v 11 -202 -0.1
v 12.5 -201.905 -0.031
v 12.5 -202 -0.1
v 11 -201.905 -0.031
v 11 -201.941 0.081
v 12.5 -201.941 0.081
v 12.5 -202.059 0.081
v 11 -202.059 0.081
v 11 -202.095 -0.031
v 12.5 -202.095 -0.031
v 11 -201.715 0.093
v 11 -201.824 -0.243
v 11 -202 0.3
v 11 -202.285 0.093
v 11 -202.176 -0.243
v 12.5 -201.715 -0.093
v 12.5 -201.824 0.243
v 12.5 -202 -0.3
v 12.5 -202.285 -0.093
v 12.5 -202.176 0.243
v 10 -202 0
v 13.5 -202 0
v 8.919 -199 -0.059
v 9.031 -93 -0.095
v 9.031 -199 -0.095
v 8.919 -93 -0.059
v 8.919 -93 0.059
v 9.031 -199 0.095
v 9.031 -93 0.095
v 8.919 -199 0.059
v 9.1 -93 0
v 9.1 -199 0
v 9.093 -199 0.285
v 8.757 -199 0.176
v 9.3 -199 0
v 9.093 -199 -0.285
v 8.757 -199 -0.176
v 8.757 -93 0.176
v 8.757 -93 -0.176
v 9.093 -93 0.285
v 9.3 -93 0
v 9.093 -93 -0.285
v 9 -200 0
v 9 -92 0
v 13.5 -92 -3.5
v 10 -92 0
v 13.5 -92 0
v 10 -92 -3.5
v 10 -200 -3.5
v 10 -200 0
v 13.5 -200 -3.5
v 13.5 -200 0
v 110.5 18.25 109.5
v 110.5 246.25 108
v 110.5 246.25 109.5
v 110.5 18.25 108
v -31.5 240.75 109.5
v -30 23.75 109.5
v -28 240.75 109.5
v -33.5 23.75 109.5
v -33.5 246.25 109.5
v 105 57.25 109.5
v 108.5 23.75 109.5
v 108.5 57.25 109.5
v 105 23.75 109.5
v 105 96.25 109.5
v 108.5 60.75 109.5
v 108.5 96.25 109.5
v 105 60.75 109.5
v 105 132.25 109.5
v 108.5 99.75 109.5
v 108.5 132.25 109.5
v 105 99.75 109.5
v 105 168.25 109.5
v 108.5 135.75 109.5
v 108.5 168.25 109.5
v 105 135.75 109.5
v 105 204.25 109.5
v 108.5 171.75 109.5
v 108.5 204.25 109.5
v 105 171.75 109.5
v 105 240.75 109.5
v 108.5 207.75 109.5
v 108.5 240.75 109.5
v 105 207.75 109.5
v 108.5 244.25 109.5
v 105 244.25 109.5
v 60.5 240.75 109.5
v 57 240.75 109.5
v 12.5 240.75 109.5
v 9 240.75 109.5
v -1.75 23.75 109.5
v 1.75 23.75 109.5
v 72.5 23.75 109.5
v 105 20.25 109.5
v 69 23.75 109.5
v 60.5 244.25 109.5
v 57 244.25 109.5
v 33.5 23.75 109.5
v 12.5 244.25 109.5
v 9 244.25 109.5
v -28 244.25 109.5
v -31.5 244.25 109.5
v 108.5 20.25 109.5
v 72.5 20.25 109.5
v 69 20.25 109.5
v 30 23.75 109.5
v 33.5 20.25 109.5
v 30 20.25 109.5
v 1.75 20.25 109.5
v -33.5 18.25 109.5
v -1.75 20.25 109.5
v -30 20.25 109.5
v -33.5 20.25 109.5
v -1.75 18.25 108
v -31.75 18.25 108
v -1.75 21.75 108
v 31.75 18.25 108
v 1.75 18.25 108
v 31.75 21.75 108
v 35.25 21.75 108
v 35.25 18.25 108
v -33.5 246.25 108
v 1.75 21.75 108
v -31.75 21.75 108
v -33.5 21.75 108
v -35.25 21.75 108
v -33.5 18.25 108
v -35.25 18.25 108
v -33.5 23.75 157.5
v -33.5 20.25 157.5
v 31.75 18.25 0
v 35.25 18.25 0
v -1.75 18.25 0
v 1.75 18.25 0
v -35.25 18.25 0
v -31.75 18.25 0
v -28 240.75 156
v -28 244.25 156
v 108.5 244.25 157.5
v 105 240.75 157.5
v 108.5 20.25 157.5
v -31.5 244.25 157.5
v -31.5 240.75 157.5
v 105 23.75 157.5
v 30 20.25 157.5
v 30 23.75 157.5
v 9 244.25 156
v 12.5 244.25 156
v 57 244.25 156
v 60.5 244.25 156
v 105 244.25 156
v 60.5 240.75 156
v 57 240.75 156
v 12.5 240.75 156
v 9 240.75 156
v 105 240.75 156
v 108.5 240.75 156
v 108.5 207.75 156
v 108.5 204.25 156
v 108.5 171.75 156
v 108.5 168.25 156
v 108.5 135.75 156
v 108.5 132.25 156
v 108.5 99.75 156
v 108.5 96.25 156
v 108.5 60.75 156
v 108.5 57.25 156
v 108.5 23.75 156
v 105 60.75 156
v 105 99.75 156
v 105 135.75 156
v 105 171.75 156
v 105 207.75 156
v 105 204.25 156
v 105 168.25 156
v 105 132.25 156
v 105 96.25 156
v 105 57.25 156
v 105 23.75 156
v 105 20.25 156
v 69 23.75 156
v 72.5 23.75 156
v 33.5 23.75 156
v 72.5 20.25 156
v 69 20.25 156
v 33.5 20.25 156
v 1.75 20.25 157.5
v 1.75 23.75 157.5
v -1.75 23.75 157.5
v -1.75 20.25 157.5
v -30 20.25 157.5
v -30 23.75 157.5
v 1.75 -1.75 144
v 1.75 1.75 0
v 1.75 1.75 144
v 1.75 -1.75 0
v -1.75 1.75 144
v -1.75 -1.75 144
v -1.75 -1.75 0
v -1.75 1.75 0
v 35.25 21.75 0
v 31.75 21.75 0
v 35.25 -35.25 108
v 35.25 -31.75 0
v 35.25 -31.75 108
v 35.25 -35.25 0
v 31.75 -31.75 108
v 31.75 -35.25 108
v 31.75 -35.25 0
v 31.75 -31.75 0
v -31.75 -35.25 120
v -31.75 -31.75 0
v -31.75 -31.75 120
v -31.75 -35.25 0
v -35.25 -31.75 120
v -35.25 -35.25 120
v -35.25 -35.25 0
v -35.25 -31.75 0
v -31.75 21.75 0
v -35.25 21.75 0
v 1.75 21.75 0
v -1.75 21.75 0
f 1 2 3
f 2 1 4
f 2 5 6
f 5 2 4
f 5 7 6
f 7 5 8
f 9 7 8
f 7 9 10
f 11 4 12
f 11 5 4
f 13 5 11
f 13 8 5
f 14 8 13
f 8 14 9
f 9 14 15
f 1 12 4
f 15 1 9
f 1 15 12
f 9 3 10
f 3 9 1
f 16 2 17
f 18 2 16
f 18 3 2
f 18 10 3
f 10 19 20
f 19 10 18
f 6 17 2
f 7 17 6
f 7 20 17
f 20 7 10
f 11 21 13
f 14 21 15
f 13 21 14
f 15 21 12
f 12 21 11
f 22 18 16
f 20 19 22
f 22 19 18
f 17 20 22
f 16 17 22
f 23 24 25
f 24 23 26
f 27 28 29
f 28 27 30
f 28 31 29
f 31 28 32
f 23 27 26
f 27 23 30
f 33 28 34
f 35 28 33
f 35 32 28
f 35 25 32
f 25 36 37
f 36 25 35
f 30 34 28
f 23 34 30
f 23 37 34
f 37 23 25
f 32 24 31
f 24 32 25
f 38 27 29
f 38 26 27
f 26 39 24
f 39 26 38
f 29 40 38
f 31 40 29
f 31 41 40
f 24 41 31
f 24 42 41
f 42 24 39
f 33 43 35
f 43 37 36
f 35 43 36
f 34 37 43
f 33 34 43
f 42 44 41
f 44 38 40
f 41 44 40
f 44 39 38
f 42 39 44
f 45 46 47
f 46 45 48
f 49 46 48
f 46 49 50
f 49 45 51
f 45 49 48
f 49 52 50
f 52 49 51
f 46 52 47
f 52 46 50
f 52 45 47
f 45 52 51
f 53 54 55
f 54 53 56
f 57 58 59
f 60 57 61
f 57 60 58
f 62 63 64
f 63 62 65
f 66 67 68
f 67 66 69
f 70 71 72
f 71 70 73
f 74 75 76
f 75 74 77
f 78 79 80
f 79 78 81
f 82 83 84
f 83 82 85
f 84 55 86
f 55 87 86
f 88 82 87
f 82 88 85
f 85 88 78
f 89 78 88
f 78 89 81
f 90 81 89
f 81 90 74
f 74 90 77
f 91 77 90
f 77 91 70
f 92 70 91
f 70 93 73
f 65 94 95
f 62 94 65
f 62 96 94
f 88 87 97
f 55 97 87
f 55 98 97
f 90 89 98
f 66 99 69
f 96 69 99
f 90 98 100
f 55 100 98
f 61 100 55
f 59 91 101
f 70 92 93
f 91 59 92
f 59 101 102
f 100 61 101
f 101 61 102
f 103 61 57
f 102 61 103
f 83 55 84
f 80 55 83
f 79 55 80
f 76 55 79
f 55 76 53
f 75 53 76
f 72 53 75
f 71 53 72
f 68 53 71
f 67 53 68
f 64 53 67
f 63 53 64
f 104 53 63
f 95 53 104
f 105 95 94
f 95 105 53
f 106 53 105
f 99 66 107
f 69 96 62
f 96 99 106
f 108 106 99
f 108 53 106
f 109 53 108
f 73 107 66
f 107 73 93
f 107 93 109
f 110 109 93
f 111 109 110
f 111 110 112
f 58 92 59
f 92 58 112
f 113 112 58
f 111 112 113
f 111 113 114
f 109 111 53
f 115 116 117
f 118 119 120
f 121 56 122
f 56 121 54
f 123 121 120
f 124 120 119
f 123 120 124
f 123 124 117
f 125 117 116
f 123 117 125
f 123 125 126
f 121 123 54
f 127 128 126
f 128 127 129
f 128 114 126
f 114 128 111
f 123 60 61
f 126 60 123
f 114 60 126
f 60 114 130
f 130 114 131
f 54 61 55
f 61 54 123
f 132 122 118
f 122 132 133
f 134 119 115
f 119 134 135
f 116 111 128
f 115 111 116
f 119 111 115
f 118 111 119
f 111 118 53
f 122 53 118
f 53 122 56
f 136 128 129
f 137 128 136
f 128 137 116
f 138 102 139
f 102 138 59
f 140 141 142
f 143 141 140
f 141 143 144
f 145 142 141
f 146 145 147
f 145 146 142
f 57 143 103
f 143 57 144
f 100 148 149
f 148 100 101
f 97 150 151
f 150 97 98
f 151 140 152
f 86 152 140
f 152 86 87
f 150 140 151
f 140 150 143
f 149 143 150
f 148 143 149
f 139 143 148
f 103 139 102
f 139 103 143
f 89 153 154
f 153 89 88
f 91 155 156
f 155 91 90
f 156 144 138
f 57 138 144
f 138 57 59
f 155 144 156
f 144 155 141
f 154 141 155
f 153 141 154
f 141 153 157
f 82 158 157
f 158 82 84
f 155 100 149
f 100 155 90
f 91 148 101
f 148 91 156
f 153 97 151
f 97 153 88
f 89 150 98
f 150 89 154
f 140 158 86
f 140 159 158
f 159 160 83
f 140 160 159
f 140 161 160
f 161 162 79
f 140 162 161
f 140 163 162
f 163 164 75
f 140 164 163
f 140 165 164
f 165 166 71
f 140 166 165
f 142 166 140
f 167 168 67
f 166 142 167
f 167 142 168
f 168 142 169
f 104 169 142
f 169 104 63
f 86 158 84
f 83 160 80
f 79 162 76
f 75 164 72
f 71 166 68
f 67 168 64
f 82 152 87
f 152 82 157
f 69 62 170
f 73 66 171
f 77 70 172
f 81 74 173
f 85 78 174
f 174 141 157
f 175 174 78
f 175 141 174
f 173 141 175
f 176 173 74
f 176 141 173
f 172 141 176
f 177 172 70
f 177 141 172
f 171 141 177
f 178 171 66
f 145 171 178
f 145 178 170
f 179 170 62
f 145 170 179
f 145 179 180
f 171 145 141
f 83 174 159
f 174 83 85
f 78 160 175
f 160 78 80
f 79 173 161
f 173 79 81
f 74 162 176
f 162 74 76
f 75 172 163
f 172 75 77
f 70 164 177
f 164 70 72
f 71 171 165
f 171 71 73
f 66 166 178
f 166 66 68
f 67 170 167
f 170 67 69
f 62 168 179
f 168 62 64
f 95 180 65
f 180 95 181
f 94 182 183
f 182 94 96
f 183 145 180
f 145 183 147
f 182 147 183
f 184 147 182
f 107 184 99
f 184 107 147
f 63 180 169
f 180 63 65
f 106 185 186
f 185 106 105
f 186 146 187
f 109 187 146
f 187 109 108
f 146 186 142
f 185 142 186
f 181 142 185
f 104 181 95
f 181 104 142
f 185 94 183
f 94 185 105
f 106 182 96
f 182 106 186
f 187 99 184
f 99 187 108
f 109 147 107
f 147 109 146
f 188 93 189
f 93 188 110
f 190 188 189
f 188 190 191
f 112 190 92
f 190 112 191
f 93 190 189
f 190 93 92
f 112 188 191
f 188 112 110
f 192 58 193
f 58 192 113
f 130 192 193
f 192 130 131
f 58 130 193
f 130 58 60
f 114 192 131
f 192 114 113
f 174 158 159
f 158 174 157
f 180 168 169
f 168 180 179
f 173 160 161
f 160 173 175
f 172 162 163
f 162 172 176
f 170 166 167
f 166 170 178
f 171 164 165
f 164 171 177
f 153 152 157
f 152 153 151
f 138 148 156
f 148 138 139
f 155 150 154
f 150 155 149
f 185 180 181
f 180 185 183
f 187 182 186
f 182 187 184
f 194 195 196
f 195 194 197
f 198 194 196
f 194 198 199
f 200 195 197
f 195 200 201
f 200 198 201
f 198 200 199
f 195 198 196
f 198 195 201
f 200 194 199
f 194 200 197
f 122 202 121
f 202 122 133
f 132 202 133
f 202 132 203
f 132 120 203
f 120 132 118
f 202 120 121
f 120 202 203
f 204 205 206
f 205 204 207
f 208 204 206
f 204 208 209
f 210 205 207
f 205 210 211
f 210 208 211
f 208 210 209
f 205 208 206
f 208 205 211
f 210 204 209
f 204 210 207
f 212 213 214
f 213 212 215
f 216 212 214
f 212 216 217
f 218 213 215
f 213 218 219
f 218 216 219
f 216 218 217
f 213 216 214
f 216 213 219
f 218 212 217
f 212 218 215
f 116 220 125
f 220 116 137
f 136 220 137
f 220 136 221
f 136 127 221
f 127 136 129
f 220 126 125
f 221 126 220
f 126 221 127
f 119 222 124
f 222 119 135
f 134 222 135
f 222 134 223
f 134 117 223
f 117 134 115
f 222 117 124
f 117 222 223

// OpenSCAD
// file: ../lib/common.scad
//--------------------------------------------------------------------------------------------------
// Module Prism
//--------------------------------------------------------------------------------------------------
module prism(z, y, x)
{
    rotate([0, 90, 0])
    {
        polyhedron(
                points=[[0,0,0], [x,0,0], [x,y,0], [0,y,0], [0,y,z], [x,y,z]],
                faces=[[0,1,2,3],[5,4,3,2],[0,4,5,1],[0,3,4],[5,2,1]]);
    }
}

//--------------------------------------------------------------------------------------------------
// Module Side panel
//--------------------------------------------------------------------------------------------------
module rect_cut(x, y, z, dx, dy)
{
    // Top panel
    translate([0, dy, 0])
    {
        cube([x, y - dy, z]);
    };

    // Left bottom panel
    translate([0, 0, 0])
    {
        cube([dx, dy, z]);
    };

    // Triangle
    translate([dx, 0, 0])
    {
        rotate([0, 0, 0])
        {
            prism(x - dx, dy, -z);
        }
    };
}

//--------------------------------------------------------------------------------------------------
// X dimensional arrow
//--------------------------------------------------------------------------------------------------
module arrow_x(l)
{
    line_w = 0.1;
    arrow_w = 1;
    arrow_h = 0.3;

    // Line
    translate([l / 2, 0, 0])
    {
        rotate([0, 90, 0])
        {
            color([0.4, 0.4, 0.4])
            cylinder(l - arrow_w * 2, line_w, line_w, true);
        }
    }

    // Left arrow
    translate([arrow_w, 0, 0])
    {
        rotate([0, 270, 0])
        {
            color([0.4, 0.4, 0.4])
            cylinder(arrow_w, arrow_h, 0, false);
        }
    }

    // Right arrow
    translate([l - arrow_w, 0, 0])
    {
        rotate([0, 90, 0])
        {
            color([0.4, 0.4, 0.4])
            cylinder(arrow_w, arrow_h, 0, false);
        }
    }

    // Text
    translate([l/3, 0.5, 0])
    {
        color([0.4, 0.4, 0.4])
        text(str(l), size=1);
    }
}

//--------------------------------------------------------------------------------------------------
// Y dimensional arrow
//--------------------------------------------------------------------------------------------------
module arrow_y(l)
{
    line_w = 0.1;
    arrow_w = 1;
    arrow_h = 0.3;

    // Line
    translate([0, l / 2, 0])
    {
        rotate([90, 0, 00])
        {
            color([0.4, 0.4, 0.4])
            cylinder(l - arrow_w * 2, line_w, line_w, true);
        }
    }

    // Left arrow
    translate([0 ,arrow_w, 0])
    {
        rotate([90, 0, 0])
        {
            color([0.4, 0.4, 0.4])
            cylinder(arrow_w, arrow_h, 0, false);
        }
    }

    // Right arrow
    translate([0, l - arrow_w, 0])
    {
        rotate([270, 0, 0])
        {
            color([0.4, 0.4, 0.4])
            cylinder(arrow_w, arrow_h, 0, false);
        }
    }

    // Text
    translate([-0.5, l/3, 0])
    {
        rotate([0 ,0, 90])
        {
            color([0.4, 0.4, 0.4])
            text(str(l), size=1);
        }
    }
}

//--------------------------------------------------------------------------------------------------
// Z dimensional arrow
//--------------------------------------------------------------------------------------------------
module arrow_z(l)
{
    line_w = 0.11;
    arrow_w = 1;
    arrow_h = 0.3;

    // Line
    translate([0, 0, l / 2])
    {
        rotate([0, 0, 0])
        {
            color([0.4, 0.4, 0.4])
            cylinder(l - arrow_w * 2, line_w, line_w, true);
        }
    }

    // Left arrow
    translate([0, 0, arrow_w])
    {
        rotate([0, 180, 0])
        {
            color([0.4, 0.4, 0.4])
            cylinder(arrow_w, arrow_h, 0, false);
        }
    }

    // Right arrow
    translate([0, 0, l - arrow_w])
    {
        rotate([0, 0, 0])
        {
            color([0.4, 0.4, 0.4])
            cylinder(arrow_w, arrow_h, 0, false);
        }
    }

    // Text
    translate([0.5, 0, l/3])
    {
        rotate([90 ,0, 90])
        {
            color([0.4, 0.4, 0.4])
            text(str(l), size=1);
        }
    }
}

//--------------------------------------------------------------------------------------------------
// parallelogram
//--------------------------------------------------------------------------------------------------
module parallelogram(x = 12, y = 12, z = 1, xd = 0)
{
    points = [
        [0, 0, 0 ],        //0
        [x, 0, 0 ],        //1
        [x + xd, y, 0],    //2
        [xd, y, 0 ],       //3
        [0, 0, z ],        //4
        [x, 0, z ],        //5
        [x + xd, y, z ],   //6
        [xd, y, z ]];      //7

    faces = [
        [0,1,2,3],         // bottom
        [4,5,1,0],         // front
        [7,6,5,4],         // top
        [5,6,2,1],         // right
        [6,7,3,2],         // back
        [7,4,0,3]];        // left

    polyhedron(points, faces);
}

//--------------------------------------------------------------------------------------------------
// common board
//--------------------------------------------------------------------------------------------------
module board(w, h, d, r, g, b)
{
    color([r, g, b])
    cube([w, h, d]);
}

//--------------------------------------------------------------------------------------------------
// board dimension
//--------------------------------------------------------------------------------------------------
module dimension(w, h, d, r, g, b, part_x, part_y)
{
    translate([part_x, -part_y, 0])
    {
        rotate([-90, 0, 0])
        {
            board(w, h, d, r, g, b);
        }
            
        translate([0, -2, 0])
        {
            color([0, 0, 0])
            arrow_x(w);
        };

        translate([-1, 0, 0])
        {
            color([0, 0, 0])
            arrow_y(d);
        };
    }
}
// main file
include <../lib/common.scad>

PartY = 200;
StairHeight = 8.2;
StairWidth = 30;
Thick = 1.5;
PoleThick = 3.5;


//------------------------------------------------------------------------------
// Render
//------------------------------------------------------------------------------

// Post 1
translate([-PoleThick / 2, -PoleThick / 2, 0])
{
    board(PoleThick, PoleThick, 12 * 12, 0.5, 0.5, 0);
}
dimension(PoleThick, PoleThick, 9 * 12, 0.5, 0.5, 0, 10, PartY);

translate([StairWidth + 3.5 / 2, 20 - 3.5 / 2, 0])
{
    board(PoleThick, PoleThick, 9 * 12, 0.5, 0.5, 0);
}

translate([StairWidth + 3.5 / 2, -StairWidth - PoleThick - PoleThick / 2, 0])
{
    board(PoleThick, PoleThick, 9 * 12, 0.5, 0.5, 0);
}

translate([-StairWidth - 3.5 - 3.5 / 2, -StairWidth - PoleThick - PoleThick / 2, 0])
{
    board(PoleThick, PoleThick, 10 * 12, 0.5, 0.5, 0);
}

translate([-StairWidth - 3.5 - 3.5 / 2, 20 - 3.5 / 2, 0])
{
    board(PoleThick, PoleThick, 9 * 12, 0.5, 0.5, 0);
}

translate([-3.5 / 2, 20 - 3.5 / 2, 0])
{
    board(PoleThick, PoleThick, 9 * 12, 0.5, 0.5, 0);
}

// stair board
// 1 -------------2
// |              |  
// 0 ------------ 3
//
// (x0, y0, x1, y1, x2, y2, x3, y3, z)
module stair_board(x0, y0, x1, y1, x2, y2, x3, y3, z)
{
    polyhedron(
        points=[[x0,y0,0], [x1,y1,0], [x2,y2,0], [x3,y3,0], [x0,y0,z], [x1,y1,z], [x2,y2,z], [x3,y3,z]],
        faces=[[0,1,2], [0,2,3],[0,4,3],[4,7,3],[0,1,5],[0,4,5],[1,2,6],[1,6,5],[2,3,7],[2,7,6],[4,5,6],[4,6,7]]);
}

module stair_dimension(w, d)
{
    translate([part_x, -part_y, 0])
    {
        translate([0, -2, 0])
        {
            color([0, 0, 0])
            arrow_x(w);
        };

        translate([-1, 0, 0])
        {
            color([0, 0, 0])
            arrow_y(d);
        };
    }
}

module Stair00()
{
    color([0, 1, 0.4])
    stair_board(0, 0, 0, 10, StairWidth + Thick * 2, 10, StairWidth + Thick * 2, 0, 1.5);
}

module Stair01()
{
    color([1, 0, 0])
    stair_board(PoleThick / 2, -PoleThick / 2, PoleThick / 2, PoleThick / 2, StairWidth + PoleThick / 2 + Thick, PoleThick / 2 + 15, StairWidth + PoleThick / 2 + Thick, 0, 1.5);
}

module Stair02()
{
    color([0, 0.4, 0.9])
    stair_board(PoleThick / 2, -PoleThick / 2, PoleThick / 2, PoleThick / 2, StairWidth + PoleThick / 2 + Thick, PoleThick / 2 + 30 + Thick, StairWidth + PoleThick / 2 + Thick, 15 + PoleThick / 2, 1.5);
}

module Stair03()
{
    color([1, 0.4, 0.4])
    stair_board(PoleThick / 2, 15 - PoleThick / 2, PoleThick / 2, 15 + PoleThick / 2, StairWidth  + PoleThick / 2 + Thick, 15 + PoleThick / 2, StairWidth + PoleThick / 2 + Thick, -PoleThick / 2, 1.5);
}

// Stair 0-1
translate([-StairWidth - 3.5 / 2 - Thick, 10 -3.5 / 2, 12 * 9 - Thick - StairHeight])
{
    rotate([0, 0, 0])
    {
        Stair00();
    }
}

// Stair 0-2
translate([-StairWidth - 3.5 / 2 - Thick, -3.5 / 2, 12 * 9 - Thick - StairHeight * 2])
{
    rotate([0, 0, 0])
    {
        Stair00();
    }
}

// Stair 1
translate([0, 0, 12 * 9 - Thick - StairHeight * 3])
{
    rotate([0, 0, -180])
    {
        Stair01();
    }
}

// Stair 2
translate([0, 0, 12 * 9 - Thick - StairHeight * 4])
{
    rotate([0, 0, -180])
    {
        Stair02();
    }
}

// Stair 3
translate([0, 0, 12 * 9 - StairHeight * 5])
{
    rotate([180, 0, -90])
    {
        Stair02();
    }
}

// Stair 4
translate([0, 0, 12 * 9 - StairHeight * 6])
{
    rotate([180, 0, -90])
    {
        Stair01();
    }
}

// Stair 5
translate([0, 0, 12 * 9 - Thick - StairHeight * 7])
{
    rotate([0, 0, -90])
    {
        Stair01();
    }
}

// Stair 6
translate([0, 0, 12 * 9 - Thick - StairHeight * 8])
{
    rotate([0, 0, -90])
    {
        Stair02();
    }
}

// Stair 7
translate([0, 0, 12 * 9 - StairHeight * 9])
{
    rotate([180, 0, 0])
    {
        Stair02();
    }
}

// Stair 8
translate([0, -15, 12 * 9 - Thick - StairHeight * 10])
{
    rotate([0, 0, 0])
    {
        Stair03();
    }
}

// Stair 0-3
translate([3.5 / 2 - Thick, 3.5 / 2, 12 * 9 - Thick - StairHeight * 11])
{
    rotate([0, 0, 0])
    {
        Stair00();
    }
}

// Stair 0-4
translate([3.5 / 2 -  Thick, 10, 12 * 9 - Thick - StairHeight * 12])
{
    rotate([0, 0, 0])
    {
        Stair00();
    }
}


module StairBase01()
{
    color([0.7, 0.9, 0.7])
    stair_board(0, 0, 0, 6.7, StairWidth + 20, 6.7, StairWidth + 20, 0, 1.5);
}

module StairBase02()
{
    color([0.7, 0.9, 0])
    stair_board(0, 0, 0, 6.7, 20 - PoleThick, 6.7, 20 - PoleThick, 0, 1.5);
}

module StairBase03()
{
    color([0.7, 0.4, 0.7])
    stair_board(0, 0, 0, 6.7, StairWidth * 2 + PoleThick, 6.7, StairWidth * 2 + PoleThick, 0, 1.5);
}

// Stair base 1
translate([-StairWidth - PoleThick / 2, 20 - PoleThick / 2, 12 * 9 - StairHeight * 2])
{
    rotate([90, 0, 270])
    {
        StairBase01();
    }
}

translate([-StairWidth - PoleThick / 2, 20 - PoleThick / 2, 12 * 9 - StairHeight * 3])
{
    rotate([90, 0, 270])
    {
        StairBase01();
    }
}

translate([-StairWidth - PoleThick / 2, 20 - PoleThick / 2, 12 * 9 - StairHeight * 4])
{
    rotate([90, 0, 270])
    {
        StairBase01();
    }
}

translate([-StairWidth - PoleThick / 2, 20 - PoleThick / 2, 12 * 9 - StairHeight * 5])
{
    rotate([90, 0, 270])
    {
        StairBase01();
    }
}

// Stair base 2
translate([-(PoleThick / 2 - Thick), 20 - PoleThick / 2, 12 * 9 - StairHeight * 2])
{
    rotate([90, 0, 270])
    {
        StairBase02();
    }
}

translate([-(PoleThick / 2 - Thick), 20 - PoleThick / 2, 12 * 9 - StairHeight * 3])
{
    rotate([90, 0, 270])
    {
        StairBase02();
    }
}

// Stair base 3
translate([StairWidth + PoleThick / 2, -StairWidth - Thick - PoleThick / 2, 12 * 9 - StairHeight * 6])
{
    rotate([90, 0, 180])
    {
        StairBase03();
    }
}

translate([StairWidth + PoleThick / 2, -StairWidth - Thick - PoleThick / 2, 12 * 9 - StairHeight * 7])
{
    rotate([90, 0, 180])
    {
        StairBase03();
    }
}

translate([StairWidth + PoleThick / 2, -StairWidth - Thick - PoleThick / 2, 12 * 9 - StairHeight * 8])
{
    rotate([90, 0, 180])
    {
        StairBase03();
    }
}

translate([StairWidth + PoleThick / 2, -StairWidth - Thick - PoleThick / 2, 12 * 9 - StairHeight * 9])
{
    rotate([90, 0, 180])
    {
        StairBase03();
    }
}

// Stair base 4
translate([StairWidth + PoleThick / 2 + Thick, 20 - PoleThick / 2, 12 * 9 - StairHeight * 10])
{
    rotate([90, 0, 270])
    {
        StairBase01();
    }
}

translate([StairWidth + PoleThick / 2 + Thick, 20 - PoleThick / 2, 12 * 9 - StairHeight * 11])
{
    rotate([90, 0, 270])
    {
        StairBase01();
    }
}

translate([StairWidth + PoleThick / 2 + Thick, 20 - PoleThick / 2, 12 * 9 - StairHeight * 12])
{
    rotate([90, 0, 270])
    {
        StairBase01();
    }
}

translate([StairWidth + PoleThick / 2 + Thick, 20 - PoleThick / 2, 12 * 9 - StairHeight * 13])
{
    rotate([90, 0, 270])
    {
        StairBase01();
    }
}

// Stair base 5
translate([PoleThick / 2, 20 - PoleThick / 2, 12 * 9 - StairHeight * 12])
{
    rotate([90, 0, 270])
    {
        StairBase02();
    }
}

translate([PoleThick  / 2, 20 - PoleThick / 2, 12 * 9 - StairHeight * 13])
{
    rotate([90, 0, 270])
    {
        StairBase02();
    }
}


// deck

translate([-33.5, 20 -3.5 / 2, 0])
{
    translate([0, 0, 12 * 9])
    {
        color([1, 1, 0])
        board(12 * 12, 12 * 19
        , 1.5, 1, 0, 0);
    }

    // Deck Post
    translate([2, 12 * 19 - 3.5 - 2, 12 * 9 + 1.5])
    {
        board(3.5, 3.5, 12 * 4, 0.5, 0.7, 1);
    }

    translate([12 * 4 - 3.5 - 2, 12 * 19 - 3.5 - 2, 12 * 9 + 1.5])
    {
        board(3.5, 3.5, 12 * 4, 0.5, 0.7, 1);
    }

    translate([12 * 8 - 3.5 - 2, 12 * 19 - 3.5 - 2, 12 * 9 + 1.5])
    {
        board(3.5, 3.5, 12 * 4, 0.5, 0.7, 1);
    }

    translate([12 * 12 - 3.5 - 2, 12 * 19 - 3.5 - 2, 12 * 9 + 1.5])
    {
        board(3.5, 3.5, 12 * 4, 0.5, 0.7, 1);
    }

    translate([12 * 12 - 3.5 - 2, 12 * 15.5, 12 * 9 + 1.5])
    {
        board(3.5, 3.5, 12 * 4, 0.5, 0.7, 1);
    }

    translate([12 * 12 - 3.5 - 2, 12 * 12.5, 12 * 9 + 1.5])
    {
        board(3.5, 3.5, 12 * 4, 0.5, 0.7, 1);
    }

    translate([12 * 12 - 3.5 - 2, 12 * 9.5, 12 * 9 + 1.5])
    {
        board(3.5, 3.5, 12 * 4, 0.5, 0.7, 1);
    }

    translate([12 * 12 - 3.5 - 2, 12 * 6.5, 12 * 9 + 1.5])
    {
        board(3.5, 3.5, 12 * 4, 0.5, 0.7, 1);
    }

    translate([12 * 12 - 3.5 - 2, 12 * 3.25, 12 * 9 + 1.5])
    {
        board(3.5, 3.5, 12 * 4, 0.5, 0.7, 1);
    }

    translate([12 * 12 - 3.5 - 2, 2, 12 * 9 + 1.5])
    {
        board(3.5, 3.5, 12 * 4, 0.5, 0.7, 1);
    }

    translate([12 * 9 - 3.5 - 2, 2, 12 * 9 + 1.5])
    {
        board(3.5, 3.5, 12 * 4, 0.5, 0.7, 1);
    }

    translate([63.5, 2, 12 * 9 + 1.5])
    {
        board(3.5, 3.5, 12 * 4, 0.5, 0.7, 1);
    }

    translate([30 + 3.5 / 2, 2, 12 * 9 + 1.5])
    {
        board(3.5, 3.5, 12 * 4, 0.5, 0.7, 1);
    }

    translate([0, 2, 12 * 9 + 1.5])
    {
        board(3.5, 3.5, 12 * 4, 0.5, 0.7, 1);
    }

    // Deck Rails
    translate([12 * 12 - 3.5 - 2, 2, 12 * 13])
    {
        color([1, 0.6, 0.2])
        board(3.5, 12 * 18 + 8, 1.5, 1, 0, 0);
    }

    translate([2, 12 * 19 - 2, 12 * 13])
    {
        rotate([0, 0, -90])
        {
            color([1, 0, 1])
            board(3.5, 12 * 11 + 8, 1.5, 1, 0, 0);
        }
    }

    translate([33.5 * 2, 3.5 + 2, 12 * 13])
    {
        rotate([0, 0, -90])
        {
            color([1, 0, 1])
            board(3.5, 12 * 6 + 0.5 , 1.5, 1, 0, 0);
        }
    }

}


/*
Wire:
12 ft * 10 * 2 = 240 ft
19Ft * 10 = 190 ft
450 ft
76 + 63 = 139 = 150ft

* Wire 600 ft : $45.99 (400ft) X 2 = $92
https://www.amazon.com/gp/product/B08DFPK92T/ref=ox_sc_act_title_1?smid=AWBF18OIWWCF7&psc=1

* End(CR23) : 40
4" : $35.99 (40) 
https://www.amazon.com/Muzata-Threaded-Terminal-Fitting-Stainless/dp/B07X69BWBY/ref=sr_1_17?dchild=1&keywords=Muzata%2BCR30&qid=1607473682&sr=8-17&th=1

6" : $19.99 (10)
https://www.amazon.com/Threaded-Tension-Terminal-Stainless-CR39/dp/B07RDHNWG6/ref=sr_1_9?dchild=1&keywords=Muzata+CR30&qid=1607473583&sr=8-9

* Dead End(CR24) : 40
$34.99 X 2 (40) = $69.98
https://www.amazon.com/Muzata-Stainless-handcrimp-Stemball-Railing/dp/B078H4W8GZ/ref=sr_1_1_sspa?dchild=1&keywords=Muzata+CR24&qid=1605090029&sr=8-1-spons&psc=1&spLa=ZW5jcnlwdGVkUXVhbGlmaWVyPUExSklSR1Y1OVFGRVZYJmVuY3J5cHRlZElkPUEwODc3NzgxMU9QUVBDM0pGTkFHOCZlbmNyeXB0ZWRBZElkPUEwODIwNjU1M0JIOU5GTkFTRUpZUSZ3aWRnZXROYW1lPXNwX2F0ZiZhY3Rpb249Y2xpY2tSZWRpcmVjdCZkb05vdExvZ0NsaWNrPXRydWU=

* Corner 45 Degree: 40 : $45.99
https://www.amazon.com/CKE-Stainless-Beveled-Protector-Sleeves/dp/B08DTV1FC1/ref=sr_1_4_sspa?dchild=1&keywords=CKE&qid=1605088202&sr=8-4-spons&psc=1&spLa=ZW5jcnlwdGVkUXVhbGlmaWVyPUFLQzJWSlpKNlk0TkgmZW5jcnlwdGVkSWQ9QTAwNjQ4NjEzN1lOVUJORE5LSTNIJmVuY3J5cHRlZEFkSWQ9QTAwNDI3NjEyN0dHWk5GMU1PNUNGJndpZGdldE5hbWU9c3BfYXRmJmFjdGlvbj1jbGlja1JlZGlyZWN0JmRvTm90TG9nQ2xpY2s9dHJ1ZQ==

* Protector Sleeves: 220

$39.99 X 2 = $79.98 : 200
https://www.amazon.com/Muzata-Stainless-Protective-Balustrade-CR13/dp/B07426BBKH?ref_=ast_sto_dp

$17.99 : 40
https://www.amazon.com/Muzata-Stainless-Protective-Balustrade-CK16/dp/B07JN2D5KV?ref_=ast_sto_dp

* 30 Degree Angled Beveled Washer : 40
$45.99 : 50
https://www.amazon.com/Professional-Stainless-Balustrade-Railings-Aluminum/dp/B082YQYHQB/ref=sr_1_13_sspa?dchild=1&keywords=Angle+Beveled+Washer+for+1%2F8%22&qid=1607475095&s=hi&sr=1-13-spons&psc=1&spLa=ZW5jcnlwdGVkUXVhbGlmaWVyPUExVlo0N1A5SkdBTTJHJmVuY3J5cHRlZElkPUEwNzM4MDkxMTNBOExKMElPSURJSSZlbmNyeXB0ZWRBZElkPUEwMTA2NTk2M0s4SVlSU0M1U1Q2OSZ3aWRnZXROYW1lPXNwX210ZiZhY3Rpb249Y2xpY2tSZWRpcmVjdCZkb05vdExvZ0NsaWNrPXRydWU=

* Tool
Hydraulic Cable Crimper: $56.98
https://www.amazon.com/Goplus-Hydraulic-Crimper-Terminal-Crimping/dp/B00ZA2P3XM/ref=sr_1_7?dchild=1&keywords=Hydraulic+Cable+Crimper&qid=1607475871&s=hi&sr=1-7

Drill guide: 
30 & 45 : 29.99 X 2 = $59.98
https://www.amazon.com/Muzata-Installation-Horizontal-Drilling-Template/dp/B083Q8K2N5/ref=sr_1_4?dchild=1&keywords=30%2Bdegree%2Bdrill%2Bguide&qid=1607476940&s=hi&sr=1-4&th=1


*/
